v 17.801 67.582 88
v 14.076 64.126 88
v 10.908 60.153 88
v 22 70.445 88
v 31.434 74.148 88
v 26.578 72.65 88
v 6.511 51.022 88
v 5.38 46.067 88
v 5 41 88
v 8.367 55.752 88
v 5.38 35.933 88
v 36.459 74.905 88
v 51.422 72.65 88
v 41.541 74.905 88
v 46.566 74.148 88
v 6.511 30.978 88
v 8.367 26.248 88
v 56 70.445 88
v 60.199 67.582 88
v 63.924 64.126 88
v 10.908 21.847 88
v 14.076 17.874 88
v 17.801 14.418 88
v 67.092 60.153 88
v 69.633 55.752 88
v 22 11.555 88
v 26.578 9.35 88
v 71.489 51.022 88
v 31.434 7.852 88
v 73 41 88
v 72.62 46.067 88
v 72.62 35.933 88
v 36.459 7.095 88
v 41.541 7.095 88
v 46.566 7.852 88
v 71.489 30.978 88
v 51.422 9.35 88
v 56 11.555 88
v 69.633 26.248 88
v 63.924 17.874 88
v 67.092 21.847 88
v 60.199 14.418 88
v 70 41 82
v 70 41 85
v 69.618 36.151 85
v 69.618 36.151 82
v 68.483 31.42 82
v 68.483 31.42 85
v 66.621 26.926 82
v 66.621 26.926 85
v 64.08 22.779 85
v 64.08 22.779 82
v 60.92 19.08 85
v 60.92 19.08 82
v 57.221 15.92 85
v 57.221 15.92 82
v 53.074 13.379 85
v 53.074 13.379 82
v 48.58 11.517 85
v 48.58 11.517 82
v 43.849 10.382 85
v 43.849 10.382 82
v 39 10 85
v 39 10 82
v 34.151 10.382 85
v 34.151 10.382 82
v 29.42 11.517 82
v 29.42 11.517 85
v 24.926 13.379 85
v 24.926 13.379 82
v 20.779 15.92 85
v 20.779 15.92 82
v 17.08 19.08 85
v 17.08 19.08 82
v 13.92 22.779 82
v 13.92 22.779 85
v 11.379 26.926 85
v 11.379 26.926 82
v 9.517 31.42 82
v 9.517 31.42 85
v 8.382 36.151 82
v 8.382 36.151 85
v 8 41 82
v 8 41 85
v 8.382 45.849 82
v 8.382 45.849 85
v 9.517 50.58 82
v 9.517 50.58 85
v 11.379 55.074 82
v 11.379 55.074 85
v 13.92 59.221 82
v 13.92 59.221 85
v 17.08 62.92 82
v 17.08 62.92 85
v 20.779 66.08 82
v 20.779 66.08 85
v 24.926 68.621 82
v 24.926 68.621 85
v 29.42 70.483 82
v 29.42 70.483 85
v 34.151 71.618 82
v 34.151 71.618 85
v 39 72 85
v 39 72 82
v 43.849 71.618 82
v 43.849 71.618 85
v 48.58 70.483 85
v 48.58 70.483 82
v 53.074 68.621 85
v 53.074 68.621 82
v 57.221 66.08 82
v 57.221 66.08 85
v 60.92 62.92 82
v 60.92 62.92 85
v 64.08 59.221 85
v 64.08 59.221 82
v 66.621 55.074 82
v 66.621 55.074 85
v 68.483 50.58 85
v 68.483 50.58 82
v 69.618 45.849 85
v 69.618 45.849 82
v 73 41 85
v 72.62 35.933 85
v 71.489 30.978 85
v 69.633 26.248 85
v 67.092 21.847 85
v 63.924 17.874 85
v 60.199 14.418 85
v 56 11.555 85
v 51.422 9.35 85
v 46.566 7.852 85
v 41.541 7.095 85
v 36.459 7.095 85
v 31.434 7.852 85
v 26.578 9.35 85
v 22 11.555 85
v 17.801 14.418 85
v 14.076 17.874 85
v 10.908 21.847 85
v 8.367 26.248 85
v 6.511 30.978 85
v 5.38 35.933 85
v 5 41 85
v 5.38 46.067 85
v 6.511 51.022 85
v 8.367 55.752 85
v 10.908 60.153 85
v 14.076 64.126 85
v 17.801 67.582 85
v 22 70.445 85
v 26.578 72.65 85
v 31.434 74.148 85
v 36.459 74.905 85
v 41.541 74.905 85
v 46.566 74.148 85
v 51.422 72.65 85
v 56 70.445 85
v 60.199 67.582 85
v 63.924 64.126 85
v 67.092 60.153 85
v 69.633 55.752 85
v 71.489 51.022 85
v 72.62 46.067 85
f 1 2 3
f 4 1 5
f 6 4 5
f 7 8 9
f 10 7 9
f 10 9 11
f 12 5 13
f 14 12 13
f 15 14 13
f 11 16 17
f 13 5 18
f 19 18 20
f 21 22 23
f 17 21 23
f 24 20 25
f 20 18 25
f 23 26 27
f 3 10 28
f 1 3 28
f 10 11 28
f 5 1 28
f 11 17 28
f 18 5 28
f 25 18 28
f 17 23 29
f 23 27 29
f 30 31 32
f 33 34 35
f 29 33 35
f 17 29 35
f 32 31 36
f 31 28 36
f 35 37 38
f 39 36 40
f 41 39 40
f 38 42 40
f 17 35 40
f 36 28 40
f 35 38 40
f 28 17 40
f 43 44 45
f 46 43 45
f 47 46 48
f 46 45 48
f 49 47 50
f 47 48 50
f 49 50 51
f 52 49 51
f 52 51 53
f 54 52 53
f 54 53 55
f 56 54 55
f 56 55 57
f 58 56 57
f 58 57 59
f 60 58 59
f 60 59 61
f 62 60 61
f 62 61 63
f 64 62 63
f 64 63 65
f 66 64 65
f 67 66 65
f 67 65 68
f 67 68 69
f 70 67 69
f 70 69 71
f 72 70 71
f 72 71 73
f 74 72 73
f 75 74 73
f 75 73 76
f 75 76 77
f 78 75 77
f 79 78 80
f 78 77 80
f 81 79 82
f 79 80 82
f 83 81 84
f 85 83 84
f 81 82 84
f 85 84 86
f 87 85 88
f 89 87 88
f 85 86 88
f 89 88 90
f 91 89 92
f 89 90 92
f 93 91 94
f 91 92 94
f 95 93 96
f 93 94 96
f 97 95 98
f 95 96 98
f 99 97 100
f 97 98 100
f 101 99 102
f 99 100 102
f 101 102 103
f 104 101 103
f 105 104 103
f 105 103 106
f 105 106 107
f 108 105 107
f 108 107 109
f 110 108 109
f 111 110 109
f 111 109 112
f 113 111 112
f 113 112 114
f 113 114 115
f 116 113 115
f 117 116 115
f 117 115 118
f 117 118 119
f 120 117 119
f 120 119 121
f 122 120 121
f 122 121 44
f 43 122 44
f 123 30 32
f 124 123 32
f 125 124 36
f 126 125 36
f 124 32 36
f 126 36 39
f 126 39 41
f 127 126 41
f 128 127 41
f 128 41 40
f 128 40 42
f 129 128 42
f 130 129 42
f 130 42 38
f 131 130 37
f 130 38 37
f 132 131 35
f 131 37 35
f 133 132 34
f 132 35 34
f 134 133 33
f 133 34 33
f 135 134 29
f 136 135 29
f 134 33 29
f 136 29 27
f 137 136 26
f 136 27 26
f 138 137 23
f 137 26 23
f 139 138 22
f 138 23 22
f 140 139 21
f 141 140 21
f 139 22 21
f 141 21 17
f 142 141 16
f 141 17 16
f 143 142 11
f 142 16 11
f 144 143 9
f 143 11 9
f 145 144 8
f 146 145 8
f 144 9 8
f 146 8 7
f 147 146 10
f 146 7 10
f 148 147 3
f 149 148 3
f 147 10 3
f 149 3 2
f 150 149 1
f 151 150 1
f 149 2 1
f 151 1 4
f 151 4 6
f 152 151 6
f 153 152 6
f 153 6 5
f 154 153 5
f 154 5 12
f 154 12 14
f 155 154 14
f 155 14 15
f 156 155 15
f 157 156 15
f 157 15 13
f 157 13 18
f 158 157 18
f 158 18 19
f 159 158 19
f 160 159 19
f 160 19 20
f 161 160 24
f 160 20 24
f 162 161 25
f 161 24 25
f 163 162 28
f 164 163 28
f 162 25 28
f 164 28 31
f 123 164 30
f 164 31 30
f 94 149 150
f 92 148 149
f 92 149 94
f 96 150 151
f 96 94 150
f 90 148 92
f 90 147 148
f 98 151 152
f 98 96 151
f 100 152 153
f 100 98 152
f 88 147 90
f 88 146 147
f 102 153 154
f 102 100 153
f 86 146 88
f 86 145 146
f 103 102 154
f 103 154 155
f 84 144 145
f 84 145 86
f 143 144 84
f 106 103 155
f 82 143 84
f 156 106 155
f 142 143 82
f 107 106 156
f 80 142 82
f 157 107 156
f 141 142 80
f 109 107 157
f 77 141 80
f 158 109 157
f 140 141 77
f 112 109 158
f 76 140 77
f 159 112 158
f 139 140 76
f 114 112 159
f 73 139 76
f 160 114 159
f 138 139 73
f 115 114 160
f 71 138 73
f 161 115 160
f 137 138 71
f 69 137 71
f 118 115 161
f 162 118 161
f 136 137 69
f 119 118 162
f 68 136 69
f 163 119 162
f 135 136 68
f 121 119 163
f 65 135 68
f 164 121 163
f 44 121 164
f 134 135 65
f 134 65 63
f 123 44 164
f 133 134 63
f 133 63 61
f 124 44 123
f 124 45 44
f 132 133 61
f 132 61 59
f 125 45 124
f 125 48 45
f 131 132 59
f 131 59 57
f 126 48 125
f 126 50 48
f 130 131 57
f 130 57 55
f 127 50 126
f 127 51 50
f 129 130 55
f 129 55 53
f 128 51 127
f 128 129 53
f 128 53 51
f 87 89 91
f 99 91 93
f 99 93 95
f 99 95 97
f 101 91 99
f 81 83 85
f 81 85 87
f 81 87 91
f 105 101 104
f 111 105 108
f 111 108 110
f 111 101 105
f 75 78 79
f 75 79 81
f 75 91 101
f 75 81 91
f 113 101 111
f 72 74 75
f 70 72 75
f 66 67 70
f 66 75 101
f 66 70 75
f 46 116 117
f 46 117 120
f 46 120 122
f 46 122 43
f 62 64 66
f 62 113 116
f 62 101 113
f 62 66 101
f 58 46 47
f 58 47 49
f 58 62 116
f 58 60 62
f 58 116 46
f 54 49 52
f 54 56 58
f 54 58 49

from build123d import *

# Parameters (mm, degrees)
CYLINDER048_R             = 31
CYLINDER048_DEPTH         = 6
CYLINDER047_R             = 34
CYLINDER047_DEPTH         = 3
FUSION025_PLACEMENT_ANGLE = 180


with BuildPart() as cylinder048:
    # Cylinder048 → Cylinder048 (new body)
    with BuildSketch(Plane.XY):
        Circle(CYLINDER048_R)
    extrude(amount=CYLINDER048_DEPTH)


with BuildPart() as cap:
    # Cylinder047 → Cylinder047 (new body)
    with BuildSketch(Plane.XY):
        Circle(CYLINDER047_R)
    extrude(amount=CYLINDER047_DEPTH)

    # Fusion025: union Cylinder048
    add(cylinder048.part)


with BuildPart() as cap_1:
    # Fusion025 placement: moved
    add(cap.part.moved(Location((39, 41, 88))).rotate(Axis((39, 41, 88), (1, 0, 0)), FUSION025_PLACEMENT_ANGLE))


solid = cap_1.part
